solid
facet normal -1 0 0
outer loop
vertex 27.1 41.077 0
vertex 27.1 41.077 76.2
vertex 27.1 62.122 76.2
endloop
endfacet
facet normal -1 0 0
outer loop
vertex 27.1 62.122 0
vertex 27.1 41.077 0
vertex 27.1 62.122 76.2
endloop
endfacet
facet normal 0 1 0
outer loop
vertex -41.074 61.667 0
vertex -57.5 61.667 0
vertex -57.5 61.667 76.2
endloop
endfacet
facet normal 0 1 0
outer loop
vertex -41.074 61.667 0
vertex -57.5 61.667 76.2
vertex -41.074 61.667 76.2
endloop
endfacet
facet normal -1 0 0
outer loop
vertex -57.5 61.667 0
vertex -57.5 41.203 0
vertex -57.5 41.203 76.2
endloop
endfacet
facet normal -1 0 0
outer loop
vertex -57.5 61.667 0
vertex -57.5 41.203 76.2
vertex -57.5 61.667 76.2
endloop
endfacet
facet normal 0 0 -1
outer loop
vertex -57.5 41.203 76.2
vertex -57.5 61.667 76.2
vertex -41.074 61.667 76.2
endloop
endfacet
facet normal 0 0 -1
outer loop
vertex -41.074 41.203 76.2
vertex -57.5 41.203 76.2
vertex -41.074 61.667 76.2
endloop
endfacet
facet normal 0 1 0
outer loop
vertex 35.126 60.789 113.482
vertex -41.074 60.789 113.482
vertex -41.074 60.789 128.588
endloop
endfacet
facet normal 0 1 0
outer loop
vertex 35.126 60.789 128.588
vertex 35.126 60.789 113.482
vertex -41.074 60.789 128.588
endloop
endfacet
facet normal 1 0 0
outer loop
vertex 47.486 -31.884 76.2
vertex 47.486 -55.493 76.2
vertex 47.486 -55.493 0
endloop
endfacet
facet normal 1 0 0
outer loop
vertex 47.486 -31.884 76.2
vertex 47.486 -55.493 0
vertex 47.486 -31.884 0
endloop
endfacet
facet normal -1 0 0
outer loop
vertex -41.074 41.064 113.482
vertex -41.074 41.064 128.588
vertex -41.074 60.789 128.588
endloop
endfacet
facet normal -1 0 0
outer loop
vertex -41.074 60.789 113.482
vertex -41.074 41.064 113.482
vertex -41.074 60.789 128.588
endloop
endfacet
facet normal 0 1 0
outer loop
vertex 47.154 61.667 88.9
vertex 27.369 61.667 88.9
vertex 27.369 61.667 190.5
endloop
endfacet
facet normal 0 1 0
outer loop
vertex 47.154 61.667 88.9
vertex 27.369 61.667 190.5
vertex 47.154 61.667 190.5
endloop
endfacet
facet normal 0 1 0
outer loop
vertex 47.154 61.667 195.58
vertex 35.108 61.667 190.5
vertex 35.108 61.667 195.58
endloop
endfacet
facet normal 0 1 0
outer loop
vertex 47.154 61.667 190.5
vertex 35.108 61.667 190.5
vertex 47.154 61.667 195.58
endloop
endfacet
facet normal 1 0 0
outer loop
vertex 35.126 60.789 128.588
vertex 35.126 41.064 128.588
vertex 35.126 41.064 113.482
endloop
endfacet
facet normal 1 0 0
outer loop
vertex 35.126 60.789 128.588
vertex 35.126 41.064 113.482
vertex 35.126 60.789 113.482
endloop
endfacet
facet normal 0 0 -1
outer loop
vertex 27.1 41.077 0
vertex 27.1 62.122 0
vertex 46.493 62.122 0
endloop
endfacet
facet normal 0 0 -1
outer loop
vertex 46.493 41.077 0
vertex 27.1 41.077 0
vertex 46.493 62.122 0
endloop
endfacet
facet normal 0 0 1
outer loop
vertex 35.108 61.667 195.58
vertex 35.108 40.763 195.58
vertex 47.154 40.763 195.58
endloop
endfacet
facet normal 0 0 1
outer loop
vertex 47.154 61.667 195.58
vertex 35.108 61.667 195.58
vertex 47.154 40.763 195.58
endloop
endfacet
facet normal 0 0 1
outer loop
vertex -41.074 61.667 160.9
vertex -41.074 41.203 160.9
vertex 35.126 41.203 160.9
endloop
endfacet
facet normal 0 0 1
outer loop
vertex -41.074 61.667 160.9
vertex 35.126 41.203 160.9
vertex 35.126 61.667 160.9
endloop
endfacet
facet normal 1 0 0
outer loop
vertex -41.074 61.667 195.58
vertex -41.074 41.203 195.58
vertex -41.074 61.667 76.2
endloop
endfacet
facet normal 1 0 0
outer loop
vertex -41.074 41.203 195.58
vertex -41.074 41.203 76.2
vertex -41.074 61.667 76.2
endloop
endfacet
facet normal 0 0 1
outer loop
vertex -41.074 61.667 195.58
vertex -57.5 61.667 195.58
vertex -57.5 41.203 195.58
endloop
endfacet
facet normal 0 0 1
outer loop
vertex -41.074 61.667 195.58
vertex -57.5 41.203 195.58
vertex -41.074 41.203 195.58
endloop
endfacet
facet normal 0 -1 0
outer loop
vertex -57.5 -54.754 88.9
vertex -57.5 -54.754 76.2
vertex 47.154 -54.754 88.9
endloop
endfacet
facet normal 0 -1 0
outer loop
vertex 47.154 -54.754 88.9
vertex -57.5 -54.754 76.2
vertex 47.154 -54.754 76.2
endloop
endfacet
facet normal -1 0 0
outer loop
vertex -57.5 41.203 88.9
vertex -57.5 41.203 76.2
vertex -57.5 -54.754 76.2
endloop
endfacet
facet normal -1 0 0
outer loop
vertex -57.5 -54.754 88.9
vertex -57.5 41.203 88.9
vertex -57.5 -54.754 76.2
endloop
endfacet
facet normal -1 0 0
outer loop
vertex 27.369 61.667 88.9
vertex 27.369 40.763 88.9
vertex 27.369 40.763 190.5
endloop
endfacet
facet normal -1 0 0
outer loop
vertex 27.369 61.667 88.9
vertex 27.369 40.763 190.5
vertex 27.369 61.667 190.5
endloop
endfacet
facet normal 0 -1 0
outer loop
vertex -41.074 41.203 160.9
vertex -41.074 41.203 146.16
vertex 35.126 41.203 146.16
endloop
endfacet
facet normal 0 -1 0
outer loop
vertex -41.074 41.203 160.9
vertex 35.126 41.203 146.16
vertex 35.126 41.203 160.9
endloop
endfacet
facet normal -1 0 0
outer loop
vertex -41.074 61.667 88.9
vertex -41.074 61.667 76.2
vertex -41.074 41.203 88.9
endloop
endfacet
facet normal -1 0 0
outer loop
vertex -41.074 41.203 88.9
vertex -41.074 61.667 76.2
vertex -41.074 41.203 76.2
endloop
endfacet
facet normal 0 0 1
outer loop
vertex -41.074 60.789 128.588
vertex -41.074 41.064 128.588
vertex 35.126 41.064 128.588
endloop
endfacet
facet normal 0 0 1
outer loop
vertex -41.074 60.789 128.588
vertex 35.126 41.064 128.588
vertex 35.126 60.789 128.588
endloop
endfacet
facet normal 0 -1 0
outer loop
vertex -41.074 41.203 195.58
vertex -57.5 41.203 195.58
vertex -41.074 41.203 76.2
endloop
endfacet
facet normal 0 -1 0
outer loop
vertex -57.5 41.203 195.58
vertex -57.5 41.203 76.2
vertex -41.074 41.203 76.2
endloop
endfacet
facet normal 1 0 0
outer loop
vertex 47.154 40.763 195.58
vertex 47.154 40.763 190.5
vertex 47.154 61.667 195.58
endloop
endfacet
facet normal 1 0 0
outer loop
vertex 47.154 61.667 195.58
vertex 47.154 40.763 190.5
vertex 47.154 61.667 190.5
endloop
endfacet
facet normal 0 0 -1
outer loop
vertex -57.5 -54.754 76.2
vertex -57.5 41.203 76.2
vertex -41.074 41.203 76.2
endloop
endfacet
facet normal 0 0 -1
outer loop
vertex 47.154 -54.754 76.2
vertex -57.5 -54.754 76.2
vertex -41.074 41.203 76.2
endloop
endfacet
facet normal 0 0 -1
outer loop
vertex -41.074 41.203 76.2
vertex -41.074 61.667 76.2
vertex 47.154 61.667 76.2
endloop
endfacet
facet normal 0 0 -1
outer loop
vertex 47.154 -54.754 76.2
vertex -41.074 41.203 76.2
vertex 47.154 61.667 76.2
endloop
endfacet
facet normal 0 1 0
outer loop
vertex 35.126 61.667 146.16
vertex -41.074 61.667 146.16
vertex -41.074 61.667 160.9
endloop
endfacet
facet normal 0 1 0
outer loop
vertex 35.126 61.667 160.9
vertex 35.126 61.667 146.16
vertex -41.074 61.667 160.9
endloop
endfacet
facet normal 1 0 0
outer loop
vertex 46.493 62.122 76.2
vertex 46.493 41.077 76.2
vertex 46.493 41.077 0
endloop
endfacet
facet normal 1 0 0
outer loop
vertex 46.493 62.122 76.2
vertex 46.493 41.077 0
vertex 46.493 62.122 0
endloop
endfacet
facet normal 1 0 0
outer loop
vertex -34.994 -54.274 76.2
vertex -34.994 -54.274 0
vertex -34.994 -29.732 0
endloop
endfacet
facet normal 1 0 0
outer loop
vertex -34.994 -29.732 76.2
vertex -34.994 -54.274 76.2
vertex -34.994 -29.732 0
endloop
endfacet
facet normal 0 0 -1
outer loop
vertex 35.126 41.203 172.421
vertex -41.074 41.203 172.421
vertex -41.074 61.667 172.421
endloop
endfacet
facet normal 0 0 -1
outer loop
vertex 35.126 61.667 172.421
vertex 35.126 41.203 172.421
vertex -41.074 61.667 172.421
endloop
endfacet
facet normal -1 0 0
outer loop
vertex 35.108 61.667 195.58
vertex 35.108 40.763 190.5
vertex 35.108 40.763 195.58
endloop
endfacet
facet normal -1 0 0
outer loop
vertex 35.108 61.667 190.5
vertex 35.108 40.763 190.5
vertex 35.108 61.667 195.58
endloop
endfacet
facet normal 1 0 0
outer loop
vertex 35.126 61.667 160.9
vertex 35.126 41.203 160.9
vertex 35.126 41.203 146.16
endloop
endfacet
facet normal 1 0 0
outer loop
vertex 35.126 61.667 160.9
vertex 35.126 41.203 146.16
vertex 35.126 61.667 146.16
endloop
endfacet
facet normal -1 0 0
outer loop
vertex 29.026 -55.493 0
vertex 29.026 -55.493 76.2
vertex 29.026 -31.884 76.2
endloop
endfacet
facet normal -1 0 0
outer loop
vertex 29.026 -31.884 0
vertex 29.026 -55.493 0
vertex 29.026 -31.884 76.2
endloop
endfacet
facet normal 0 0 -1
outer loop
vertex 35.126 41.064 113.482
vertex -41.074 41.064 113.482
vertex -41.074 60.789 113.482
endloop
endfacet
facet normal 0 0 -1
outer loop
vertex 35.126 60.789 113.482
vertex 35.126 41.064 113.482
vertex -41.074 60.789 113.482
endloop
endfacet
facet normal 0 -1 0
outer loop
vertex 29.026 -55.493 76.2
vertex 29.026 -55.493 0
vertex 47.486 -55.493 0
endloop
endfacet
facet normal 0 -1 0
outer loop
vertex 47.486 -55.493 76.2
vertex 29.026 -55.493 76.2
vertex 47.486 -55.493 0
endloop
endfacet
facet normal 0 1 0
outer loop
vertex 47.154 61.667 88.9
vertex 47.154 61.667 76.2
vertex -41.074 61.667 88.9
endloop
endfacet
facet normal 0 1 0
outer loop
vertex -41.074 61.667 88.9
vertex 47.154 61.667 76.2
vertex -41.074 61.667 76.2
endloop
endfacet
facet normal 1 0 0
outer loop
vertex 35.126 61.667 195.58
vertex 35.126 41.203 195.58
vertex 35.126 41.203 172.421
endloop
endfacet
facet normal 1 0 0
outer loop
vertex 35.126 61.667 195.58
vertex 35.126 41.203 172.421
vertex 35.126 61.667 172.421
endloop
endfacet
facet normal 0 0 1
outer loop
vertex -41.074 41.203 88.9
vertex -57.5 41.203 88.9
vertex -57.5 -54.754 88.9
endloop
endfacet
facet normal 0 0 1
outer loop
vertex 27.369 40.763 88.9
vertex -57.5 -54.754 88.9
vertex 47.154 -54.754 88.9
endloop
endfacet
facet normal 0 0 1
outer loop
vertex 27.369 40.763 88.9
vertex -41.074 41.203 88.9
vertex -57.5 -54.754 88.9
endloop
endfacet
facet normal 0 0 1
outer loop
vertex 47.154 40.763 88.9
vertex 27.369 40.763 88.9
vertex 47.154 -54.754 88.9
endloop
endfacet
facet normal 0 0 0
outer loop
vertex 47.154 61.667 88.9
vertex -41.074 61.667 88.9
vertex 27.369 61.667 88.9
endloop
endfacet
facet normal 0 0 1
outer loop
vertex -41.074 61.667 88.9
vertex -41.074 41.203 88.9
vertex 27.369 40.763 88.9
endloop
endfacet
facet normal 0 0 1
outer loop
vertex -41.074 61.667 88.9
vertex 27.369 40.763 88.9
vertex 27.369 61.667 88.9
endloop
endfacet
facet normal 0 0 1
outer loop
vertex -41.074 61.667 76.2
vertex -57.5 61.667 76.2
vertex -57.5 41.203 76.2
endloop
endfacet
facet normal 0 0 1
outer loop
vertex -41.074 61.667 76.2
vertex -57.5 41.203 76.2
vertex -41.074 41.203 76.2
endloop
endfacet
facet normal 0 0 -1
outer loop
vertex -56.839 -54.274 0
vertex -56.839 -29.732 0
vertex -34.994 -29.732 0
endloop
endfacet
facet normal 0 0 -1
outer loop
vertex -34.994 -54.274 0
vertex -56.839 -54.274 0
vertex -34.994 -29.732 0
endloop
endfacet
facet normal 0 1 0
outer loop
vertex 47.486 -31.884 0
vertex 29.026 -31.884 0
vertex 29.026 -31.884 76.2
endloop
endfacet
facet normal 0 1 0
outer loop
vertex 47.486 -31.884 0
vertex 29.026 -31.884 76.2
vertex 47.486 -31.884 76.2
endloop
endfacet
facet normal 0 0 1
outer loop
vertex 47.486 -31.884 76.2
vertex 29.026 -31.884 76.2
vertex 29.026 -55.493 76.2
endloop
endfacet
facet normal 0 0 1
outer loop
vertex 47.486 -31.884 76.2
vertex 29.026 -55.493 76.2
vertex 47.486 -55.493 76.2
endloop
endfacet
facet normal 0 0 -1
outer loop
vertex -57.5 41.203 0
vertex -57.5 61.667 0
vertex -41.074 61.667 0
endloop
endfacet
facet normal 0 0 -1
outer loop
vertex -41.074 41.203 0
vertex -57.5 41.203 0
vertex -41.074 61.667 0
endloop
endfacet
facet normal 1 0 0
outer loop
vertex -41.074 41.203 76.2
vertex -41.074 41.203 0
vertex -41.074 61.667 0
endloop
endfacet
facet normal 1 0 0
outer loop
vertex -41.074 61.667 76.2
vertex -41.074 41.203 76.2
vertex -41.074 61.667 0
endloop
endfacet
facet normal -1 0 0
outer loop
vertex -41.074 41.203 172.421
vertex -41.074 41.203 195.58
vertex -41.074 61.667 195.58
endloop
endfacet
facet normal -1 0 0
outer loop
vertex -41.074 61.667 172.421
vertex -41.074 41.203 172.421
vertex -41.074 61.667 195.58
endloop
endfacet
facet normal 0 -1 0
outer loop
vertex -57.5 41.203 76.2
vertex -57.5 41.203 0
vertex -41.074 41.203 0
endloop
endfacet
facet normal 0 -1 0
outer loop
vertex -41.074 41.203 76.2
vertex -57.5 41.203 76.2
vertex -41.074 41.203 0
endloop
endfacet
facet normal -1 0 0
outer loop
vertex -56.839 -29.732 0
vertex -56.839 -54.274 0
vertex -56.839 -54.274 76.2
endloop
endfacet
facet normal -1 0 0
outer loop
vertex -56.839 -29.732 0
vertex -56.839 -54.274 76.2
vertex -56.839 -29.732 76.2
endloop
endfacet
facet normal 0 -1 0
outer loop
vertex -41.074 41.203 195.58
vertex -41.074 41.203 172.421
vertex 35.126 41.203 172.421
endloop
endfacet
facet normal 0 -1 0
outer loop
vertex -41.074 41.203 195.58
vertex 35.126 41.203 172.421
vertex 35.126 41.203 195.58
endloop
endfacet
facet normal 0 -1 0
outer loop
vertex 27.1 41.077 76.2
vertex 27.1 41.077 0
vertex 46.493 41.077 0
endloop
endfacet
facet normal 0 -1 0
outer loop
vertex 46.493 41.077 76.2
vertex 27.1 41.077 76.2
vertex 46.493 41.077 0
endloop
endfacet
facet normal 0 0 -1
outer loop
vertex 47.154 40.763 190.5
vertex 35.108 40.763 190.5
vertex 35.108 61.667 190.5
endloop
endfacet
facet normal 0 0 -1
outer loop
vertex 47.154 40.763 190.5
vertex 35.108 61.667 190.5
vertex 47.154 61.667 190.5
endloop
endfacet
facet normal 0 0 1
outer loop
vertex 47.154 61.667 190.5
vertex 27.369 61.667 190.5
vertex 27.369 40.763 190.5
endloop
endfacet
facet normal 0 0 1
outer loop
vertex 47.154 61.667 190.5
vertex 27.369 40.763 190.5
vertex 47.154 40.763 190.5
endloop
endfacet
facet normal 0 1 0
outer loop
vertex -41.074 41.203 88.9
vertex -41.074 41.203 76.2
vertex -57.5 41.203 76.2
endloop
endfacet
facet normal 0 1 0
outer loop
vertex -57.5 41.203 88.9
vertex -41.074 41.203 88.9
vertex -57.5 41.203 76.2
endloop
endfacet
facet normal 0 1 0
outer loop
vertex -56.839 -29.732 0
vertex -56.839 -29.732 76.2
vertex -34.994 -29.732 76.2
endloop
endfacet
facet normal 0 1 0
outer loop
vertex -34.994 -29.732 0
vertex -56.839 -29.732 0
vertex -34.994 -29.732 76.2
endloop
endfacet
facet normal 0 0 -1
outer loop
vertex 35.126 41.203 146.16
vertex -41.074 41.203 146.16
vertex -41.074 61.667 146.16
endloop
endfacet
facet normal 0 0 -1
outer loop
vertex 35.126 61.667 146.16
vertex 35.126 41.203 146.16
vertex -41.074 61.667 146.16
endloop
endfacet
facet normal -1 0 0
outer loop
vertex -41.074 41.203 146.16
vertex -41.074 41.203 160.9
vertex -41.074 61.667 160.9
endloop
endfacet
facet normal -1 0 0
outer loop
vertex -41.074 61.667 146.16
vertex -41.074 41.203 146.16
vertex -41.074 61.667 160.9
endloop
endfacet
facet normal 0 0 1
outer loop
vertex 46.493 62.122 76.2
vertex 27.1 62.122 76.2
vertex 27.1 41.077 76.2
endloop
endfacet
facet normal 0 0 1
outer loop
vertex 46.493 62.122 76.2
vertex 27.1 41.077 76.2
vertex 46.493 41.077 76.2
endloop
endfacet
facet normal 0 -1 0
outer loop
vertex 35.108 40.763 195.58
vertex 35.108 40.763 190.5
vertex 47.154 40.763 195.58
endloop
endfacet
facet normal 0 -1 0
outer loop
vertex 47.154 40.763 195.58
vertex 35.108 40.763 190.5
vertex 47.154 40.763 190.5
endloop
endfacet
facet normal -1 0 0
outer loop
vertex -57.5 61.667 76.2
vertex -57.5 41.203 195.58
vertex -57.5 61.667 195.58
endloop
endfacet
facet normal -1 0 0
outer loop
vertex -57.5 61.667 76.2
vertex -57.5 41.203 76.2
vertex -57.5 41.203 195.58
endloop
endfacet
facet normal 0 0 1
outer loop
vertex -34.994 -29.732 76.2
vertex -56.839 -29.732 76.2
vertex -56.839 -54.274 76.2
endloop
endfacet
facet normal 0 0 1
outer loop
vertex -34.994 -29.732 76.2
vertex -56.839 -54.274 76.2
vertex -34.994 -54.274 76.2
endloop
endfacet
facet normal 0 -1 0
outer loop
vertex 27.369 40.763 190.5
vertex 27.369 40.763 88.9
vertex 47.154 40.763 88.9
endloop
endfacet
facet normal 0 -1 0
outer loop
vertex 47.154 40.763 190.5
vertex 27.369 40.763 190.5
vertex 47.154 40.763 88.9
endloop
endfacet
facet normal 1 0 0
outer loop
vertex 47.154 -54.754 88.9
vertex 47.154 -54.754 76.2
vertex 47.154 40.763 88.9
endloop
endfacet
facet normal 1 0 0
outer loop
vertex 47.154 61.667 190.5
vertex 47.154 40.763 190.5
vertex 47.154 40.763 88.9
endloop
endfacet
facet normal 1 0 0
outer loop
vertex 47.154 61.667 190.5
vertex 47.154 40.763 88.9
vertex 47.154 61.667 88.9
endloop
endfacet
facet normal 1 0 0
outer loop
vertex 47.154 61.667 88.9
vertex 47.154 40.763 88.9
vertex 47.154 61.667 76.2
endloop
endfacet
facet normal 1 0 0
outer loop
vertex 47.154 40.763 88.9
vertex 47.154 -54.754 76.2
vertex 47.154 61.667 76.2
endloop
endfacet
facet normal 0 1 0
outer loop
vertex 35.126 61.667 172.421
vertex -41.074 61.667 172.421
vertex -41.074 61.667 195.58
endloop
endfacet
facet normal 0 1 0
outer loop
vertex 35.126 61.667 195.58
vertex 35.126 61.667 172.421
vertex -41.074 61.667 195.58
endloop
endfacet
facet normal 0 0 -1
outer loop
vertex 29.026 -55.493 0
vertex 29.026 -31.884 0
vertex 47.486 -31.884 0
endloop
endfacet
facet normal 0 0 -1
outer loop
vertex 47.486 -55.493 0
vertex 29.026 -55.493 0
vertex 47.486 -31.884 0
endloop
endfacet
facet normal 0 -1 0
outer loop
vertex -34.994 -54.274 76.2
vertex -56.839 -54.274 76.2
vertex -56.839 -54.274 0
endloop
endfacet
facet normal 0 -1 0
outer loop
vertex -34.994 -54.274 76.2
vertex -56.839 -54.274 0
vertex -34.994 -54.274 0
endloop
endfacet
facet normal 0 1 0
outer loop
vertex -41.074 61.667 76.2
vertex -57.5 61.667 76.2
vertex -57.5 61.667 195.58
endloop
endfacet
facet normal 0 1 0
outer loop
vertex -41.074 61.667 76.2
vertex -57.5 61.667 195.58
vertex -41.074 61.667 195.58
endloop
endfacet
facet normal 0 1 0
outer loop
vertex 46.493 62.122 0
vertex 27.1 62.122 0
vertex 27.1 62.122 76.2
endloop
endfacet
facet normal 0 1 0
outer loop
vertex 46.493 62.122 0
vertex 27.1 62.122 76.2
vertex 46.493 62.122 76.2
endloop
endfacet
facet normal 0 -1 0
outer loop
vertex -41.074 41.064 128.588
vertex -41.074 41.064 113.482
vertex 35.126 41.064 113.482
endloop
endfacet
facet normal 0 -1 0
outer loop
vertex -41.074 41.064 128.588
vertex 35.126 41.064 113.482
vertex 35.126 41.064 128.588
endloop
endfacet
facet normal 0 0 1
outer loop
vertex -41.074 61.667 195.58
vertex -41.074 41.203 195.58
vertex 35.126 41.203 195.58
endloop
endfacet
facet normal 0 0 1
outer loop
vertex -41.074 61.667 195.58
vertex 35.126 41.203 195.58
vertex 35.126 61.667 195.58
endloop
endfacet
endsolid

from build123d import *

# Parameters (mm, degrees)
F0_W      = 16.425934
F0_H      = 20.463459
F1_DEPTH  = 76.2
F2_W      = 19.392505
F2_H      = 21.04526
F3_DEPTH  = 76.2
F4_W      = 21.844752
F4_H      = 24.541287
F5_DEPTH  = 76.2
F6_W      = 18.460218
F6_H      = 23.609979
F7_DEPTH  = 76.2
F9_DEPTH  = 12.7
F10_W     = 16.425934
F10_H     = 20.463459
F11_DEPTH = 101.6
F12_W     = 19.78503
F12_H     = 20.904045
F13_DEPTH = 101.6
F14_W     = 16.425934
F14_H     = 20.463459
F15_DEPTH = 17.78
F17_W     = 19.725192
F17_H     = 15.106492
F18_DEPTH = 76.2
F16_W     = 20.463459
F16_H     = 23.158947
F19_DEPTH = 76.2
F20_W     = 12.046587
F20_H     = 20.904045
F21_DEPTH = 5.08
F22_W     = 20.463459
F22_H     = 14.740571
F23_DEPTH = 76.2


with BuildPart() as f1:
    # F0 (on Top) → F1 (new body)
    with BuildSketch(Plane.XY):
        with Locations((-49.287254, 51.43506)):
            Rectangle(F0_W, F0_H)
    extrude(amount=F1_DEPTH)


with BuildPart() as f3:
    # F2 (on Top) → F3 (new body)
    with BuildSketch(Plane.XY):
        with Locations((36.796529, 51.59935)):
            Rectangle(F2_W, F2_H)
    extrude(amount=F3_DEPTH)


with BuildPart() as f5:
    # F4 (on Top) → F5 (new body)
    with BuildSketch(Plane.XY):
        with Locations((-45.916483, -42.002873)):
            Rectangle(F4_W, F4_H)
    extrude(amount=F5_DEPTH)


with BuildPart() as f7:
    # F6 (on Top) → F7 (new body)
    with BuildSketch(Plane.XY):
        with Locations((38.25601, -43.688491)):
            Rectangle(F6_W, F6_H)
    extrude(amount=F7_DEPTH)


with BuildPart() as f9:
    # F8 (on face) → F9 (new body)
    with BuildSketch(Plane.XY.offset(76.2)):
        Polygon((47.154181, 61.66679), (-41.074287, 61.66679), (-41.074287, 41.203331), (-57.500221, 41.203331), (-57.500221, -54.754354), (47.154181, -54.754354), align=None)
    extrude(amount=F9_DEPTH)

    # F12 (on face) → F13 (join)
    with BuildSketch(Plane.XY.offset(88.9)):
        with Locations((37.261666, 51.214767)):
            Rectangle(F12_W, F12_H)
    extrude(amount=F13_DEPTH)


with BuildPart() as f11:
    # F10 (on face) → F11 (new body)
    with BuildSketch(Plane.XY.offset(76.2)):
        with Locations((-49.287254, 51.43506)):
            Rectangle(F10_W, F10_H)
    extrude(amount=F11_DEPTH)

    # F14 (on face) → F15 (join)
    with BuildSketch(Plane.XY.offset(177.8)):
        with Locations((-49.287254, 51.43506)):
            Rectangle(F14_W, F14_H)
    extrude(amount=F15_DEPTH)


with BuildPart() as f18:
    # F17 (on face) → F18 (new body)
    with BuildSketch(Plane.YZ.offset(-41.074287)):
        with Locations((50.926762, 121.035043)):
            Rectangle(F17_W, F17_H)
    extrude(amount=F18_DEPTH)


with BuildPart() as f19:
    # F16 (on face) → F19 (new body)
    with BuildSketch(Plane.YZ.offset(-41.074287)):
        with Locations((51.43506, 184.000526)):
            Rectangle(F16_W, F16_H)
    extrude(amount=F19_DEPTH)


with BuildPart() as f21:
    # F20 (on face) → F21 (new body)
    with BuildSketch(Plane.XY.offset(190.5)):
        with Locations((41.130888, 51.214767)):
            Rectangle(F20_W, F20_H)
    extrude(amount=F21_DEPTH)


with BuildPart() as f23:
    # F22 (on face) → F23 (new body)
    with BuildSketch(Plane.YZ.offset(-41.074287)):
        with Locations((51.43506, 153.52992)):
            Rectangle(F22_W, F22_H)
    extrude(amount=F23_DEPTH)


solid = Compound([f1.part, f3.part, f5.part, f7.part, f9.part, f11.part, f18.part, f19.part, f21.part, f23.part])
